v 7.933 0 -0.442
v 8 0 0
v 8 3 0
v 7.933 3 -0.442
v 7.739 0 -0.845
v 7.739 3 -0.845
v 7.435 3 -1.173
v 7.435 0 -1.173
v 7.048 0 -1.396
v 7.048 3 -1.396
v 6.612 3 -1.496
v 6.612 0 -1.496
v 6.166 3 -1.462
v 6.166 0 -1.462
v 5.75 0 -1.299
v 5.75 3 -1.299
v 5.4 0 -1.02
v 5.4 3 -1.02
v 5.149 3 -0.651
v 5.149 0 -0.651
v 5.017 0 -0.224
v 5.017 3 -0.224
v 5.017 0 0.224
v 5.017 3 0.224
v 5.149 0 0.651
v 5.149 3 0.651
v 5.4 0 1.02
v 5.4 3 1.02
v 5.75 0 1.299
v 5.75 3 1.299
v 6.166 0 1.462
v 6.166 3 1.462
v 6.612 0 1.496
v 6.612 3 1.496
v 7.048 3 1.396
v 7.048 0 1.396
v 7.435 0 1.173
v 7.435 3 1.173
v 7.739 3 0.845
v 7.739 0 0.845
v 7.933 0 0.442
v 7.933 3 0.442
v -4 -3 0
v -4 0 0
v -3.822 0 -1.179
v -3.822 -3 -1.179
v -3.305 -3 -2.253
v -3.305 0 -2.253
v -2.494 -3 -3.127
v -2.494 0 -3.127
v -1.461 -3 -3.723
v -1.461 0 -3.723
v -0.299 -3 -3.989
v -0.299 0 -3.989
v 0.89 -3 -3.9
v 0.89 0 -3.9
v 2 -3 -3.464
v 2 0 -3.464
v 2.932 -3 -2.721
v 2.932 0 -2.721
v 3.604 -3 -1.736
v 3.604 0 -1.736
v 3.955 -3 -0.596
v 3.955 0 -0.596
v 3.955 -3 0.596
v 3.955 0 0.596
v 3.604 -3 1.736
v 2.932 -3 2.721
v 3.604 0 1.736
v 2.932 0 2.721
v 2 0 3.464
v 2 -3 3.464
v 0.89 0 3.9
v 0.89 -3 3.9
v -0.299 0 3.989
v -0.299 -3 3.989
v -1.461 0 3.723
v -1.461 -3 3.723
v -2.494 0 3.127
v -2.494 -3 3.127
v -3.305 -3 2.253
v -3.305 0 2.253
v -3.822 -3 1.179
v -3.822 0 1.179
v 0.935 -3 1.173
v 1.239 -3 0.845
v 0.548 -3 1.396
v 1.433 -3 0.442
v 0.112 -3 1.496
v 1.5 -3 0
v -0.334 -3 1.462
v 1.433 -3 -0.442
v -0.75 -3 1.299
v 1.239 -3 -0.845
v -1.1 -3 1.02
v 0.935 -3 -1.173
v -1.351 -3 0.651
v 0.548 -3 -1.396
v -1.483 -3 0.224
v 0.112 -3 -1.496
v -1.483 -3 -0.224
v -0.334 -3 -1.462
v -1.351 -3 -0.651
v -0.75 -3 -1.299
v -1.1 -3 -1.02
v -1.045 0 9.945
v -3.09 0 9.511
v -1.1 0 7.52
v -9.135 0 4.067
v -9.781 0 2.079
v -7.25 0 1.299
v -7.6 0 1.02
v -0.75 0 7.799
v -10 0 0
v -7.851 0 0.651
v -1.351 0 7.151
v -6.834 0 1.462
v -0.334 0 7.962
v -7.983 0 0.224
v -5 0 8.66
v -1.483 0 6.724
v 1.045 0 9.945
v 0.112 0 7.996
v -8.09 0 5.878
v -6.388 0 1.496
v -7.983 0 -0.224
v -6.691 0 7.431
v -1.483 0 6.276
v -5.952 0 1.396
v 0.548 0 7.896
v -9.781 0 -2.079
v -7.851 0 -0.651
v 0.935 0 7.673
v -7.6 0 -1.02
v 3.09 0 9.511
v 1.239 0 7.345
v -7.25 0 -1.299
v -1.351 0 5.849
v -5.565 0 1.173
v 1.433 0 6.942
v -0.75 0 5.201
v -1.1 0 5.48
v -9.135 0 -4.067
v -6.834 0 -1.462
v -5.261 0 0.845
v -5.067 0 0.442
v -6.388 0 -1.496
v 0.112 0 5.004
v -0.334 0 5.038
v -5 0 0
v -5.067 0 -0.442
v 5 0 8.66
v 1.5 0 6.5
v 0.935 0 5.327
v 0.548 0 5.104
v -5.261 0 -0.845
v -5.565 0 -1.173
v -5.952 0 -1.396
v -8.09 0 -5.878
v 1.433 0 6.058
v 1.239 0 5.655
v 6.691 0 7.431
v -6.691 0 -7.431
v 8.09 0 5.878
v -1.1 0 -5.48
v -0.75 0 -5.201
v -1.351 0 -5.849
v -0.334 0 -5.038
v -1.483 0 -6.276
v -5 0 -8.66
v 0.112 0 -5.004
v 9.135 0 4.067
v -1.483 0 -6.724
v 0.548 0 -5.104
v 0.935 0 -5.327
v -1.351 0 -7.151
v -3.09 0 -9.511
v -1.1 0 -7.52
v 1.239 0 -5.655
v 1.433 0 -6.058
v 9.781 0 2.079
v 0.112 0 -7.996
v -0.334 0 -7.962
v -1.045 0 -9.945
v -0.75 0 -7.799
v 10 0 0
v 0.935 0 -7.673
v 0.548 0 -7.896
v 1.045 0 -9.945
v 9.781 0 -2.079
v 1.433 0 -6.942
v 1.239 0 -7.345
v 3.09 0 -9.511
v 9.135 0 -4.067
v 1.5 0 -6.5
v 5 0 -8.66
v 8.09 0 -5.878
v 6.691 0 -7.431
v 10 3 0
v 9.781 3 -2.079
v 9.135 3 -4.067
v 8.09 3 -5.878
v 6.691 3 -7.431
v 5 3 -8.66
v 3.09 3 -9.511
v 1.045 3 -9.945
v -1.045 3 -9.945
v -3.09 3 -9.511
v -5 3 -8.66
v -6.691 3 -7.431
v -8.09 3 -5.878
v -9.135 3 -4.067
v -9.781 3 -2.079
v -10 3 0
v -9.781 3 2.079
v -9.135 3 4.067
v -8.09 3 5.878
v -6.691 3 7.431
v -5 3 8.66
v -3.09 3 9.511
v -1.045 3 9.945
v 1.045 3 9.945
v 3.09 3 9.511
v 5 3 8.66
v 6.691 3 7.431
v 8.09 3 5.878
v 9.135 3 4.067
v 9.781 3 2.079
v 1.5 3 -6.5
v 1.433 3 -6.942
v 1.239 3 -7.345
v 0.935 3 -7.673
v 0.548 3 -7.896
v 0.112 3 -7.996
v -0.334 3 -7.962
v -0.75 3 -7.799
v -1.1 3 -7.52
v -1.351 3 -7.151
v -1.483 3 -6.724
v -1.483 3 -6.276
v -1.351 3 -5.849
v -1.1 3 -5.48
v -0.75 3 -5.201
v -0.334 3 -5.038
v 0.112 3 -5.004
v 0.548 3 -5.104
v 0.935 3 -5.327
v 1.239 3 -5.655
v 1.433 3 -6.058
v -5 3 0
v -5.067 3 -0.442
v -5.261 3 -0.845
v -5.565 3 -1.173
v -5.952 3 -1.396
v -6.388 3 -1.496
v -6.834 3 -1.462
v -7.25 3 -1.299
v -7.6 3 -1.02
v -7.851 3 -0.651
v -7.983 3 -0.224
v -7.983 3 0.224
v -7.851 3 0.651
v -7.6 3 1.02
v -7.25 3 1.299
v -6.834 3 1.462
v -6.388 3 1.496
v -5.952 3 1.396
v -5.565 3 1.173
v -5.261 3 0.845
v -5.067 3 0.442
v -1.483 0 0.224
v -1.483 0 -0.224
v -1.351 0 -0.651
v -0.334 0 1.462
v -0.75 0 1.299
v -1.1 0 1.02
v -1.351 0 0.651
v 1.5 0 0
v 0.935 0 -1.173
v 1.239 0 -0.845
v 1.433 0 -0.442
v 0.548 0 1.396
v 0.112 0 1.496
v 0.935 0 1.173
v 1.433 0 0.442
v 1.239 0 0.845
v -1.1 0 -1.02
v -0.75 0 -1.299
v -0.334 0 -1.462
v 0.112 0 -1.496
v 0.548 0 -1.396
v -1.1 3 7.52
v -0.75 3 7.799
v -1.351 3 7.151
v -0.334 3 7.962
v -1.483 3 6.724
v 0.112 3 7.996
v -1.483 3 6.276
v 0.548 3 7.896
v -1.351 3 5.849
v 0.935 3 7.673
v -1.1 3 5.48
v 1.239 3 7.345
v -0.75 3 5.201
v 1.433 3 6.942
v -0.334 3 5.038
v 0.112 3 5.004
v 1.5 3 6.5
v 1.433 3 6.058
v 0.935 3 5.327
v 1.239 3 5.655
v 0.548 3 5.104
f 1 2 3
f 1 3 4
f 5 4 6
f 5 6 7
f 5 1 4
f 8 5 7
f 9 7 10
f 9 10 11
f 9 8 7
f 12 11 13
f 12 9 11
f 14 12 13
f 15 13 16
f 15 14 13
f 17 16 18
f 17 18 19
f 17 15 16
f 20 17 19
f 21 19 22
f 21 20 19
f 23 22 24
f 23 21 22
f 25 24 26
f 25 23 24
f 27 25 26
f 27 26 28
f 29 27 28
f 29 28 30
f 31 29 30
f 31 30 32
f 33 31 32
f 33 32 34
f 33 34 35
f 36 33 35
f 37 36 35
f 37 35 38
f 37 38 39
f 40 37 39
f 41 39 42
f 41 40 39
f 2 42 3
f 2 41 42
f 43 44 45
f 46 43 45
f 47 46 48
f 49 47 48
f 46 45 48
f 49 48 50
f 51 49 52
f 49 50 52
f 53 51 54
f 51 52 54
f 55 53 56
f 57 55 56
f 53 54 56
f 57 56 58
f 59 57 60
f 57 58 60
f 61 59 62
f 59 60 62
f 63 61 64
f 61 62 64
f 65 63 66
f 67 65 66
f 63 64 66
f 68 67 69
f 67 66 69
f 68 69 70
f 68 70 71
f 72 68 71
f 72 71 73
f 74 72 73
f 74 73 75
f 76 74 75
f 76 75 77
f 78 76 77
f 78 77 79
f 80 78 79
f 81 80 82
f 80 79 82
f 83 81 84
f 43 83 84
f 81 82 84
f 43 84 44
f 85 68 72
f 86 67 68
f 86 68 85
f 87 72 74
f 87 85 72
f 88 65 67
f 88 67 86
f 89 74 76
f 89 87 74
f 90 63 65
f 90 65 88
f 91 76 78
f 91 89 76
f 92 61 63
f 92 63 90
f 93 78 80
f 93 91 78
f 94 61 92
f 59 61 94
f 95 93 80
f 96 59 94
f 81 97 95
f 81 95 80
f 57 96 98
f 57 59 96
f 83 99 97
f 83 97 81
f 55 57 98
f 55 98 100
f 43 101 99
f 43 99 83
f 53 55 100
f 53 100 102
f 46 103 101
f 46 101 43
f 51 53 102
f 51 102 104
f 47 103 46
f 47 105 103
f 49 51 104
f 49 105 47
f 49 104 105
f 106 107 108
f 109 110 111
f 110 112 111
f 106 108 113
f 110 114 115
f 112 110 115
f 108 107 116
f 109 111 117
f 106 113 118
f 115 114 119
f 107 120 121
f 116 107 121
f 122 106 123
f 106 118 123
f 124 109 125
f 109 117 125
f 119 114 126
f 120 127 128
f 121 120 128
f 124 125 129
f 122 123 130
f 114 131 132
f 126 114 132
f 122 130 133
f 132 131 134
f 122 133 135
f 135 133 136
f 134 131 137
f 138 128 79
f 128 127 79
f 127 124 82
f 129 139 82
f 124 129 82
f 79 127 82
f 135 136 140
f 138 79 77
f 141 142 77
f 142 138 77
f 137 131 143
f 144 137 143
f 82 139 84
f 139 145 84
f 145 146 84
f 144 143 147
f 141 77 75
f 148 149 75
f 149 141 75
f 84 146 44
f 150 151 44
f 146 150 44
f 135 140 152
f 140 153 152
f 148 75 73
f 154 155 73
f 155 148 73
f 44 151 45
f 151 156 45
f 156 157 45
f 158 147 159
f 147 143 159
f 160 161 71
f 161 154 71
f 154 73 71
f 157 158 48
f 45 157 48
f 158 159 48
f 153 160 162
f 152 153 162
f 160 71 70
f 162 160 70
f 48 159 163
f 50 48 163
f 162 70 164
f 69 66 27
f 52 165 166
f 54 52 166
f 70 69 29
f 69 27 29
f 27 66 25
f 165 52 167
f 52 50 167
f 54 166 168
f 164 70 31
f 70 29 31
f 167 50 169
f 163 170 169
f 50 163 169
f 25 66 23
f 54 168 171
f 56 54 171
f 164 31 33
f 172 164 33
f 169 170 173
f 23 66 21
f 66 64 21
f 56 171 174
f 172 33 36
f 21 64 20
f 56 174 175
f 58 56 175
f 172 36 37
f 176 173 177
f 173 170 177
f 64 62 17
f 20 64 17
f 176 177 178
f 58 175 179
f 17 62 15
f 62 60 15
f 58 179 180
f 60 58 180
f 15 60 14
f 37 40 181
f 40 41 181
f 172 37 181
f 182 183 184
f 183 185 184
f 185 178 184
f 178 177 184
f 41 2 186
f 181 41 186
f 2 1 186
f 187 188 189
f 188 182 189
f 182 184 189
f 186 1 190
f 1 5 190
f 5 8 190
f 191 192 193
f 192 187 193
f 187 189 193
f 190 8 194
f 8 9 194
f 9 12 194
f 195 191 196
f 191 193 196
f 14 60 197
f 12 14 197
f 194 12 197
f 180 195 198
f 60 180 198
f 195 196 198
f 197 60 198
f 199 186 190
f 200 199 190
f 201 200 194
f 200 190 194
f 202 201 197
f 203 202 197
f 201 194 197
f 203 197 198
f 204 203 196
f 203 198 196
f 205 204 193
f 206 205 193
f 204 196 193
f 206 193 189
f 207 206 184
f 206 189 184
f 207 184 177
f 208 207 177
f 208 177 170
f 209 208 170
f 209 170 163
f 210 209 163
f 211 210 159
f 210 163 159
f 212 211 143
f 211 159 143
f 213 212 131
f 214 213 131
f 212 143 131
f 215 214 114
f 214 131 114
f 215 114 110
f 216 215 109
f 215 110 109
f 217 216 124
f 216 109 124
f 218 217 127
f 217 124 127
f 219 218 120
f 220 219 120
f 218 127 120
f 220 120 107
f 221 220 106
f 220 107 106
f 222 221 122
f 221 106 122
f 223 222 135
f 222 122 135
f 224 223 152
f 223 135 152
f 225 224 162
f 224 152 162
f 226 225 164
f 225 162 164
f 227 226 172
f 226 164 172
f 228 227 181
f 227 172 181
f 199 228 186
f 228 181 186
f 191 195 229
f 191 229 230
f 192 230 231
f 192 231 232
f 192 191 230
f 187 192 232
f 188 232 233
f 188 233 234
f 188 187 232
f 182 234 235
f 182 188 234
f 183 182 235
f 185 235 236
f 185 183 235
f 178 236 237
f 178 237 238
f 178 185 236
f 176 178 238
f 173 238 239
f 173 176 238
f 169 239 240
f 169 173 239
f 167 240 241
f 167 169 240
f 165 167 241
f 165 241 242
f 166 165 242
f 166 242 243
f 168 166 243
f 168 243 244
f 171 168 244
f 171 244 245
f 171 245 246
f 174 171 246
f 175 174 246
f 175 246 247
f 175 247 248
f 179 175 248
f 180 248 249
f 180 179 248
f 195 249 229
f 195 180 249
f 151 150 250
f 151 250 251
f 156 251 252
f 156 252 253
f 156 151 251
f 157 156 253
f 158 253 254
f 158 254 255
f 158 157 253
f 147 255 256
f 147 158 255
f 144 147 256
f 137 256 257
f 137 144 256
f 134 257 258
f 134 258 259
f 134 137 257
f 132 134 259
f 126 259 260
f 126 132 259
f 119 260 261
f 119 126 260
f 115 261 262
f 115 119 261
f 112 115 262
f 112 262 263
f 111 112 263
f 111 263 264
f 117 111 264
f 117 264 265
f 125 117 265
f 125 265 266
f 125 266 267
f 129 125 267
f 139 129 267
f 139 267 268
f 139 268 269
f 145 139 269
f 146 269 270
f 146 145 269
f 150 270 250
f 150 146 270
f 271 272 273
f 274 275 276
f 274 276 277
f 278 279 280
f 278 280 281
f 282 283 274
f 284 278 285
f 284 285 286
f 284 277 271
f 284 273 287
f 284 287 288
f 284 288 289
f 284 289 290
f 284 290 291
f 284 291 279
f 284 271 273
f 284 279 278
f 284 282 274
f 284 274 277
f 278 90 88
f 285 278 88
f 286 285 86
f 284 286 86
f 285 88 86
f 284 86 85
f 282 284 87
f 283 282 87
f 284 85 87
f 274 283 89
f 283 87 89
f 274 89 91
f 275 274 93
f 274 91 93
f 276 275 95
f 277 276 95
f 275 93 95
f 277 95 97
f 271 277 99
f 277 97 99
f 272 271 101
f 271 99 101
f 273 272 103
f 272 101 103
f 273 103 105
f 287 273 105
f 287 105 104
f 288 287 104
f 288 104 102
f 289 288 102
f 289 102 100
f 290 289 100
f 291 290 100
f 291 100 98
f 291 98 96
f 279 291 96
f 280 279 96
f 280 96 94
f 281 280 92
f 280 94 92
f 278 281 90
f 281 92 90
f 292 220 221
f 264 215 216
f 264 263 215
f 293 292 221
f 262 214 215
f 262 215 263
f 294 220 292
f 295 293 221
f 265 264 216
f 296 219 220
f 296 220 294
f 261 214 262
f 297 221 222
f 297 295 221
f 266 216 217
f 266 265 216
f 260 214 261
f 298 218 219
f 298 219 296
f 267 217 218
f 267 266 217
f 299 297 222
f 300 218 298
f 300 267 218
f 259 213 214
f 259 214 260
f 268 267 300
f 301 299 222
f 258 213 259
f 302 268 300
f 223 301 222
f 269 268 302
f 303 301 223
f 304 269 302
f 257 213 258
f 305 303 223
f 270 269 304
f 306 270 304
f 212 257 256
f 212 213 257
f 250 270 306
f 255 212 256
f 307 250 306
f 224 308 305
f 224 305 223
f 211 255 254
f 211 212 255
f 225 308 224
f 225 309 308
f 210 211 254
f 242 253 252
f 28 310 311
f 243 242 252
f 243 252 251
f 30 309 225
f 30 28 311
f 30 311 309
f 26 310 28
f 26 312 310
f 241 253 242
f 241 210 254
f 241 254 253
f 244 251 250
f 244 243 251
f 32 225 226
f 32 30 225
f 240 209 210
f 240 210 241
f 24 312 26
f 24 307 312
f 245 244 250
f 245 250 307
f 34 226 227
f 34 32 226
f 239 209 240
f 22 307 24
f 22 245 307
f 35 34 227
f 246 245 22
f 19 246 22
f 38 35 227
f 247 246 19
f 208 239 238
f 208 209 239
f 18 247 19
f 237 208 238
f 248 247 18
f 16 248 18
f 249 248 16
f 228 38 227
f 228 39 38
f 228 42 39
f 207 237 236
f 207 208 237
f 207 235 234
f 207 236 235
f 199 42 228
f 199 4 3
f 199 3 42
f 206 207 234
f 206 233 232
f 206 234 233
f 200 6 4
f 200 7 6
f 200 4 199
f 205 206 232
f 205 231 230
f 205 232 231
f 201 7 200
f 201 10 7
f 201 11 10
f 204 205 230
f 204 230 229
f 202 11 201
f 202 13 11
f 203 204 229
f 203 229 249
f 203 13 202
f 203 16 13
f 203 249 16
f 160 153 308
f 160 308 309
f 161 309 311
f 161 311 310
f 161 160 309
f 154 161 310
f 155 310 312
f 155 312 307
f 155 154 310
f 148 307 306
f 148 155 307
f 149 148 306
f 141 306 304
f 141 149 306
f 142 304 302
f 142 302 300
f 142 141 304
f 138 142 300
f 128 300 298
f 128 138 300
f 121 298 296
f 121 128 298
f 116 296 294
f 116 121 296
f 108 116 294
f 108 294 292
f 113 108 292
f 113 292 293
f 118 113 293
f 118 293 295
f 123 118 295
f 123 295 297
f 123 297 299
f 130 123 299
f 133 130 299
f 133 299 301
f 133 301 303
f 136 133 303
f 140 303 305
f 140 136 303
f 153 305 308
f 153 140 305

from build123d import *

# Parameters (mm, degrees)
SKETCH2_R           = 10
SKETCH2_R_2         = 1.5
BOSS_EXTRUDE1_DEPTH = 3
SKETCH3_R           = 4
BOSS_EXTRUDE2_DEPTH = 3
SKETCH4_R           = 1.5
CUT_EXTRUDE1_DEPTH  = 3


with BuildPart() as part:
    # Sketch2 → Boss-Extrude1 (new body)
    with BuildSketch(Plane(origin=(0, 0, 0), x_dir=(1, 0, 0), z_dir=(0, 1, 0))):
        Circle(SKETCH2_R)
        with Locations((0, -6.5)):
            Circle(SKETCH2_R_2, mode=Mode.SUBTRACT)
        with Locations((-6.5, 0)):
            Circle(SKETCH2_R_2, mode=Mode.SUBTRACT)
        with Locations((0, 6.5)):
            Circle(SKETCH2_R_2, mode=Mode.SUBTRACT)
        with Locations((6.5, 0)):
            Circle(SKETCH2_R_2, mode=Mode.SUBTRACT)
    extrude(amount=BOSS_EXTRUDE1_DEPTH)

    # Sketch3 → Boss-Extrude2 (add)
    with BuildSketch(Plane(origin=(0, 0, 0), x_dir=(-1, 0, 0), z_dir=(0, -1, 0))):
        Circle(SKETCH3_R)
    extrude(amount=BOSS_EXTRUDE2_DEPTH)

    # Sketch4 → Cut-Extrude1 (cut)
    with BuildSketch(Plane.XZ.offset(3)):
        Circle(SKETCH4_R)
    extrude(amount=-CUT_EXTRUDE1_DEPTH, mode=Mode.SUBTRACT)


solid = part.part
